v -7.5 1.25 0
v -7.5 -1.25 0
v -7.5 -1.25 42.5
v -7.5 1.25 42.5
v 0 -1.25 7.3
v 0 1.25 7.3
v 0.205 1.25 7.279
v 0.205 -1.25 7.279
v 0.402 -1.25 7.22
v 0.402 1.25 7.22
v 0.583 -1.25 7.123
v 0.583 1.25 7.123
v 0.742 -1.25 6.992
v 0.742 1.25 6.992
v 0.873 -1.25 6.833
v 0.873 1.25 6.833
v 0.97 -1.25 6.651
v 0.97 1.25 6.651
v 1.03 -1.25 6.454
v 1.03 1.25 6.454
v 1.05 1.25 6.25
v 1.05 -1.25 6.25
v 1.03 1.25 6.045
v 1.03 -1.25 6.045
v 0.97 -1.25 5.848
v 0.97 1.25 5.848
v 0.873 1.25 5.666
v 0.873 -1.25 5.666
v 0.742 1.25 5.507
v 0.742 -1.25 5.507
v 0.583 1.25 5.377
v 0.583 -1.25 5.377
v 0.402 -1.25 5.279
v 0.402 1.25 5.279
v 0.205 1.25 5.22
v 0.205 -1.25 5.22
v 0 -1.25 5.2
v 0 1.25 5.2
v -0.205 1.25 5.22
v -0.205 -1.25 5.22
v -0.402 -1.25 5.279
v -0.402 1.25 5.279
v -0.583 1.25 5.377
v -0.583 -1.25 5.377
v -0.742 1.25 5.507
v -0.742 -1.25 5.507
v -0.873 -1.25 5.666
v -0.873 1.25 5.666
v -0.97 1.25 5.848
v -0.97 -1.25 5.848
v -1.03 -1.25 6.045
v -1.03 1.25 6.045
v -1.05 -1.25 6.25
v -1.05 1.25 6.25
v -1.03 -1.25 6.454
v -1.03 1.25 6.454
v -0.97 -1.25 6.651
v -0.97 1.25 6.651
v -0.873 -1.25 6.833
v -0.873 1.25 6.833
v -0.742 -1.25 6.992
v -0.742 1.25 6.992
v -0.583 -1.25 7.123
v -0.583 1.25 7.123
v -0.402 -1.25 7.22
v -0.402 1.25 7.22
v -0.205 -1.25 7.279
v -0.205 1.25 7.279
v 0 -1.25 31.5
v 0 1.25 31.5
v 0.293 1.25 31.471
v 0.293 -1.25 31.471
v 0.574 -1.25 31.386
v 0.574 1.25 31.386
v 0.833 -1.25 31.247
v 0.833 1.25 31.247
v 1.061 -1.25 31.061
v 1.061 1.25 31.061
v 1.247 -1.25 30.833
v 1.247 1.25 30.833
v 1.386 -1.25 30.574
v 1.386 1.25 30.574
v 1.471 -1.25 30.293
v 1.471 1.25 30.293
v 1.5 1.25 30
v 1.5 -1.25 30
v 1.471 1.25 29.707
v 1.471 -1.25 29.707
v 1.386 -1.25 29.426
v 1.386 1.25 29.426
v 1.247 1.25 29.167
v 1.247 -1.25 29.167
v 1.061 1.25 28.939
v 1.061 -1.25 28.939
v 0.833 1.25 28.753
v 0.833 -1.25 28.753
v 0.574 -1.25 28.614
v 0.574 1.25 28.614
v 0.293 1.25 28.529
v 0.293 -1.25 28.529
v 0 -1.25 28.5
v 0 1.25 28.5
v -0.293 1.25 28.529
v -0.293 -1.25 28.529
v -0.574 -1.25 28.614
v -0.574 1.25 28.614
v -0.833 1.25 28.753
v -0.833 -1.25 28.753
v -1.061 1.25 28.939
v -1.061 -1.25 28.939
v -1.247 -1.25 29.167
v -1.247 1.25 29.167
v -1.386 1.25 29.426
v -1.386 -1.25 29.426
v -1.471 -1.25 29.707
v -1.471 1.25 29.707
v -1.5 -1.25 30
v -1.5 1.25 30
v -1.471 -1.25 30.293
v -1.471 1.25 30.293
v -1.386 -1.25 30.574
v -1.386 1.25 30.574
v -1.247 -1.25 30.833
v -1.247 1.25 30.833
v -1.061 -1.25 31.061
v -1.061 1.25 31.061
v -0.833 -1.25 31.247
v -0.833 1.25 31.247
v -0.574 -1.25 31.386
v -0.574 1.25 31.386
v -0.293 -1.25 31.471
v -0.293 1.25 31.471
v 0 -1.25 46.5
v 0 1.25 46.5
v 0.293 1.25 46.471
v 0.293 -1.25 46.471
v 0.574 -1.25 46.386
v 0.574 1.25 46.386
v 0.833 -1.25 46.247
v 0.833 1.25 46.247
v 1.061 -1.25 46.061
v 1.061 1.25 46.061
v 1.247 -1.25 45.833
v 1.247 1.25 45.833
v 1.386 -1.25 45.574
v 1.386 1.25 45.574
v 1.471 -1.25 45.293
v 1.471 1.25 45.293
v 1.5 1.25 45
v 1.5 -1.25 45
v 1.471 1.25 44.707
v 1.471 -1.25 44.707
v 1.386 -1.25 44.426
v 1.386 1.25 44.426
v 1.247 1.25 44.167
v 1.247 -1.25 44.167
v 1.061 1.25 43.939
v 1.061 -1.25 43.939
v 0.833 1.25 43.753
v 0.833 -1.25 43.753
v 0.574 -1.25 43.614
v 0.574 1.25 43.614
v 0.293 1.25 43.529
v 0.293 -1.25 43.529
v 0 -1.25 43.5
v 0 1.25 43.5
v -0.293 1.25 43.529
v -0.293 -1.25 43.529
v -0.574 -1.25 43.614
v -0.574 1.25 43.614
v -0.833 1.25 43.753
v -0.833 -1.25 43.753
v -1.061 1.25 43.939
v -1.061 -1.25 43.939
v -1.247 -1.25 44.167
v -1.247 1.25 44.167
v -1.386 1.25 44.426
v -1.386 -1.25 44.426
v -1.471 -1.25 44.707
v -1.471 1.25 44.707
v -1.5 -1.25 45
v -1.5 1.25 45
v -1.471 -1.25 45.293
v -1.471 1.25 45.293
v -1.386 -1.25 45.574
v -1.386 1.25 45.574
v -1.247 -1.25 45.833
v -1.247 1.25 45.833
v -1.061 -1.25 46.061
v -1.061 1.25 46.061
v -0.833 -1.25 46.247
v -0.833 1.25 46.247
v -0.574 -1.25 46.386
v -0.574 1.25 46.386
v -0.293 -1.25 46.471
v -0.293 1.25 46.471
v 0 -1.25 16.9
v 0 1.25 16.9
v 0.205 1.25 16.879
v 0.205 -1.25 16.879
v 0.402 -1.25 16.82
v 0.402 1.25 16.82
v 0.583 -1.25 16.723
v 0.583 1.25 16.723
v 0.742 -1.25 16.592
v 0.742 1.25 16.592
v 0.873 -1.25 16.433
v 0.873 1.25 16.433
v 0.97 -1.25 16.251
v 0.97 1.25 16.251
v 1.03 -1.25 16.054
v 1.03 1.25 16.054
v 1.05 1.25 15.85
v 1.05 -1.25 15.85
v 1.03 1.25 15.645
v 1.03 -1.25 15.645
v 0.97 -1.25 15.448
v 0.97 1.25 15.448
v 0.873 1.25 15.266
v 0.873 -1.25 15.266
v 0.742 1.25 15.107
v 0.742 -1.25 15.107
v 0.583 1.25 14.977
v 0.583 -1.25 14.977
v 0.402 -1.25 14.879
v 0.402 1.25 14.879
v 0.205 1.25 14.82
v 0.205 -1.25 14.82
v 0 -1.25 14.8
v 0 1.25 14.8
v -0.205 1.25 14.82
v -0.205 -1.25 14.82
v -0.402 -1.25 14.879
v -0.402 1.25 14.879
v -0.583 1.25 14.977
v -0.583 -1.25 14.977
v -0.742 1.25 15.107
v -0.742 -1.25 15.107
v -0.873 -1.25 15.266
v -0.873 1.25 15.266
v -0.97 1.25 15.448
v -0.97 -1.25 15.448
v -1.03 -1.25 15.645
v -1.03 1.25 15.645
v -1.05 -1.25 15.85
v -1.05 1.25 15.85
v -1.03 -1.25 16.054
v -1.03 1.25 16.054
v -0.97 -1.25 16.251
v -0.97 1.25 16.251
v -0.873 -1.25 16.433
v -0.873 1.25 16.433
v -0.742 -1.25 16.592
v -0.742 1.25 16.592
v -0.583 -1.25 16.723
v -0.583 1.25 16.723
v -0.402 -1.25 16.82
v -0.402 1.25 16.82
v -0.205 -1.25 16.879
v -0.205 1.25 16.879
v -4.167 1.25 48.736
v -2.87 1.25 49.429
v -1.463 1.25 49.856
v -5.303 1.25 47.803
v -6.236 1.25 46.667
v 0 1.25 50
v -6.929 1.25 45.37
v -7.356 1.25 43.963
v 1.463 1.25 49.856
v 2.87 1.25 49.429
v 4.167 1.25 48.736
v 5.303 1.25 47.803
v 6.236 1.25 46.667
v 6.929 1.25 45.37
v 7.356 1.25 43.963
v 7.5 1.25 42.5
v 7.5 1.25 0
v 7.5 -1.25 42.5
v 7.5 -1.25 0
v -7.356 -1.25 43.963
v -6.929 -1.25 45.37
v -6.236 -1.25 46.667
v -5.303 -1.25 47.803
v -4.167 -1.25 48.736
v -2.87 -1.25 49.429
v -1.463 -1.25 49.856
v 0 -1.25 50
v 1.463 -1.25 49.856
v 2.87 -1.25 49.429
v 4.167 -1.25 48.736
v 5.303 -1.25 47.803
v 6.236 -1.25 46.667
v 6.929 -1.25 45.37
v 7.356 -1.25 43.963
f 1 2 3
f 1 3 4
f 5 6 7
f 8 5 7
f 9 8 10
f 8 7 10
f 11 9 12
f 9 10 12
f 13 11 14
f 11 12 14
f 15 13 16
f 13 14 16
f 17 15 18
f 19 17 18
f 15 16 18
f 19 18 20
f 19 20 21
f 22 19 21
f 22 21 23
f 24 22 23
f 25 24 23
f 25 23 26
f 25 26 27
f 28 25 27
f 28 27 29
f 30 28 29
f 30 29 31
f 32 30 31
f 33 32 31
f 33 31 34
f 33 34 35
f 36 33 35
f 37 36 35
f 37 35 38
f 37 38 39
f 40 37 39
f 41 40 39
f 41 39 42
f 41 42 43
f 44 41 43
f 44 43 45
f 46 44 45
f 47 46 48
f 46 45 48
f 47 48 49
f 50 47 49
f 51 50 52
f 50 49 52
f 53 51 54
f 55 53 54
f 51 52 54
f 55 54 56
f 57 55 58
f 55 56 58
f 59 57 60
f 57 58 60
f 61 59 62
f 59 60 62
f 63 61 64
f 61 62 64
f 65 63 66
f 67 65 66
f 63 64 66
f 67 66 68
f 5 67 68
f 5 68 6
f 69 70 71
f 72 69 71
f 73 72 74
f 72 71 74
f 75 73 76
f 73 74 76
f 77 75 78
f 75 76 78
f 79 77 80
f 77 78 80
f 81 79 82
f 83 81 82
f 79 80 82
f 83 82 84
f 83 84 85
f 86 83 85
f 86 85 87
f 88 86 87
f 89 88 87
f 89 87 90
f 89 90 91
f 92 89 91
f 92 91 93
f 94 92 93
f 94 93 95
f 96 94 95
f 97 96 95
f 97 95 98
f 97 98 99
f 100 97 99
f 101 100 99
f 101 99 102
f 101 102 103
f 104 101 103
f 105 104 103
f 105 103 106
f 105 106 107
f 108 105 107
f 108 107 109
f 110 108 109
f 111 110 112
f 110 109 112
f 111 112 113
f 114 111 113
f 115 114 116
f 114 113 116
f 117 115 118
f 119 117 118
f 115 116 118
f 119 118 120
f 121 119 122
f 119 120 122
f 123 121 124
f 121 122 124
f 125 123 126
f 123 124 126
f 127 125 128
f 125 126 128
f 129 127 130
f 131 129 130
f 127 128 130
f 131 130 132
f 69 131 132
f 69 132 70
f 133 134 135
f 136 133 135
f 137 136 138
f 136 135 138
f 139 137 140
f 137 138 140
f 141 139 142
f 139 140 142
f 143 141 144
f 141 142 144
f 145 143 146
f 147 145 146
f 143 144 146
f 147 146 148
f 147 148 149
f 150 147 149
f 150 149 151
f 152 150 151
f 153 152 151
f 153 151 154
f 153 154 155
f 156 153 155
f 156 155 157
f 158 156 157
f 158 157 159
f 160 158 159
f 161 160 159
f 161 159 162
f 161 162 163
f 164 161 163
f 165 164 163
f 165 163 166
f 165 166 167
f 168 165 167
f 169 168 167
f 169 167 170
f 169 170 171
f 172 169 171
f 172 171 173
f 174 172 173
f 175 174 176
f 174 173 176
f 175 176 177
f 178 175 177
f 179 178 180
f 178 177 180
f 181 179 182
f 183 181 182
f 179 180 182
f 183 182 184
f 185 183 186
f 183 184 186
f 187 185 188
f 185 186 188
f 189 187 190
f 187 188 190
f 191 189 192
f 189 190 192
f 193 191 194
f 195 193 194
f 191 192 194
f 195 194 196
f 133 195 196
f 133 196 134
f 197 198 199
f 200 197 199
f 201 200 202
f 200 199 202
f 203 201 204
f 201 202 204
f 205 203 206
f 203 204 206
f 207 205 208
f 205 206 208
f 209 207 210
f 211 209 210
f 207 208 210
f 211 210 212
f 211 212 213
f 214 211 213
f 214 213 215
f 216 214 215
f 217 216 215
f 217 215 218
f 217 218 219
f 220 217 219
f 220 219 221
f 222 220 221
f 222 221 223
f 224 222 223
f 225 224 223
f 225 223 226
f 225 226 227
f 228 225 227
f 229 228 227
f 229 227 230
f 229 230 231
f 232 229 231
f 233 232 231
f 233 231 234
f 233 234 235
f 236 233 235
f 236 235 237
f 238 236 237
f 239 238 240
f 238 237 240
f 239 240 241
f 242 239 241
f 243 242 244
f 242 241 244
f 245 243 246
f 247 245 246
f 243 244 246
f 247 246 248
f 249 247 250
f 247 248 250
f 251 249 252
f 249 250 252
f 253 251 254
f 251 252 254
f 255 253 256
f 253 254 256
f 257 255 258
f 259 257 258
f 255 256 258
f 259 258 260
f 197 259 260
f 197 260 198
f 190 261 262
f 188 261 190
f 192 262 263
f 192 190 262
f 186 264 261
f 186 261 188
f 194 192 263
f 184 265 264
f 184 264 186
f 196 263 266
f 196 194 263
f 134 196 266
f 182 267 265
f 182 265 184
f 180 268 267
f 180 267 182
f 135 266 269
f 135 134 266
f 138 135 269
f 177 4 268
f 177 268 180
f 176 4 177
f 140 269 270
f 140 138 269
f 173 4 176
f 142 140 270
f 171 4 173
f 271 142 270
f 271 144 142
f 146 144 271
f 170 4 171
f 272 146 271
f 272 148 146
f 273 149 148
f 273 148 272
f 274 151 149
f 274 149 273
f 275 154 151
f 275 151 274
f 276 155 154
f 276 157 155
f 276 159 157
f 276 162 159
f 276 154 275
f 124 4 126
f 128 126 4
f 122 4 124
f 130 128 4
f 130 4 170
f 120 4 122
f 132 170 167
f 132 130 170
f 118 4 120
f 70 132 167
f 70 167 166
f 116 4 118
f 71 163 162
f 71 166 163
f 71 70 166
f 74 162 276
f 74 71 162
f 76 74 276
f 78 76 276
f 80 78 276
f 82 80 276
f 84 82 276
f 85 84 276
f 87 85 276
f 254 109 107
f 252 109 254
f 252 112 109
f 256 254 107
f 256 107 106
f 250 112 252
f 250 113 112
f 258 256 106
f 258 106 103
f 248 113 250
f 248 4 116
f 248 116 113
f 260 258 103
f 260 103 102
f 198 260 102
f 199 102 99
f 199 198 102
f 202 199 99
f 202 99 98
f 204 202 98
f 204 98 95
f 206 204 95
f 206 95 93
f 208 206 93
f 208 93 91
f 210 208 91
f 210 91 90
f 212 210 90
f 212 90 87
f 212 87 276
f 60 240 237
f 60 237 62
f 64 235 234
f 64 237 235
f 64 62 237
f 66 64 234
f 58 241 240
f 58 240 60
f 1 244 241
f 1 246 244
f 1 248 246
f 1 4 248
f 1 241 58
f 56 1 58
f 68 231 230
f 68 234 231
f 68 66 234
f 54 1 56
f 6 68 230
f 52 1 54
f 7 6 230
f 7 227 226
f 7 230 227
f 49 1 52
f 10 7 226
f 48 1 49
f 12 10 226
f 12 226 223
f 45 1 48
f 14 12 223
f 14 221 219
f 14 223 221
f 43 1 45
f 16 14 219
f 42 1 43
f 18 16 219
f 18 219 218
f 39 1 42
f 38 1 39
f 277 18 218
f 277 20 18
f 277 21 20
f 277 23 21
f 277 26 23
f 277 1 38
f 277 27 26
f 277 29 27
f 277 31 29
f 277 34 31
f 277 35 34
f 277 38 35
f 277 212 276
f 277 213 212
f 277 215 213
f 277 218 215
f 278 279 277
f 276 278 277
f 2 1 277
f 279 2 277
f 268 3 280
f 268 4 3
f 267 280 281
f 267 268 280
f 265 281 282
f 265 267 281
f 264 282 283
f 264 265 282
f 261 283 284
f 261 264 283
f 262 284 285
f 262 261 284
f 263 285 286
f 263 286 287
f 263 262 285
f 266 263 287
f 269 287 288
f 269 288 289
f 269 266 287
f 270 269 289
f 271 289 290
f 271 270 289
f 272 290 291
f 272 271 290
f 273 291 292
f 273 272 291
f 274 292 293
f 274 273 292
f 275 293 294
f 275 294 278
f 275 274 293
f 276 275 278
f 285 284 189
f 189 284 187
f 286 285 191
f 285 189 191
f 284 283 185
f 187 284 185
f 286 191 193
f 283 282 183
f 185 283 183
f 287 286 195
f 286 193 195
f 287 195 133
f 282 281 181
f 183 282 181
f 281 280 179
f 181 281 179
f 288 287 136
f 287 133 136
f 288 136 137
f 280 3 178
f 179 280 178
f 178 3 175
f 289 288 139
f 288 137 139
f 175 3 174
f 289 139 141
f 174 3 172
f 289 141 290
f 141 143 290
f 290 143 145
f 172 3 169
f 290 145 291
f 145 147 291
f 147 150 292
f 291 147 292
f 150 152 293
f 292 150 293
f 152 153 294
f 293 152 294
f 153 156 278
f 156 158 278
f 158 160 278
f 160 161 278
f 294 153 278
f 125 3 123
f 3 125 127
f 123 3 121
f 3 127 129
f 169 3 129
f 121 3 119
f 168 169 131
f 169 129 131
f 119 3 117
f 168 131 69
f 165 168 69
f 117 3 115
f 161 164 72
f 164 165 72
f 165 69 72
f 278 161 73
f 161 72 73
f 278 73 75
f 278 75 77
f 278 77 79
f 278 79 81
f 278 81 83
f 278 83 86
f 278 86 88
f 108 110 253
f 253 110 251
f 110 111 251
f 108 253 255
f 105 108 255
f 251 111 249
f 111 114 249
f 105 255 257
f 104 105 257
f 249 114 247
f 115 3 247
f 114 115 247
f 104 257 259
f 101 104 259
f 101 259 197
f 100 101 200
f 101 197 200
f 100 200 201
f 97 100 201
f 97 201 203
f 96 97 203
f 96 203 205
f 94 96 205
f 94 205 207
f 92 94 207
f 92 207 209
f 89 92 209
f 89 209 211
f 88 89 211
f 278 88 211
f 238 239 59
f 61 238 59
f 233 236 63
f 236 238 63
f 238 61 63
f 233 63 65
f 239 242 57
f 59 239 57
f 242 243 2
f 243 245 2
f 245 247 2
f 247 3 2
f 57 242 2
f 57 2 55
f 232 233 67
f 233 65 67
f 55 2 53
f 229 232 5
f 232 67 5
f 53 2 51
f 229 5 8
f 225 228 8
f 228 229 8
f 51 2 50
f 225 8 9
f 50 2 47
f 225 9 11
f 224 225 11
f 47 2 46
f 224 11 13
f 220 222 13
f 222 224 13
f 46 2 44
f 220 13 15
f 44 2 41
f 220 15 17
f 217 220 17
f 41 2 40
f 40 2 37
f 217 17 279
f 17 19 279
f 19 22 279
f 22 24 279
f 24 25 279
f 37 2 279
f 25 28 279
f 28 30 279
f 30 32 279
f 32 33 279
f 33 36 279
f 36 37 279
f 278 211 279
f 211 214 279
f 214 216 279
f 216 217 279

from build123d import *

# Parameters (mm, degrees)
ESQUISSE1_W                = 15
ESQUISSE1_H                = 2.5
EXTRUSION1_DEPTH           = 50
ESQUISSE2_R                = 1.5
EXTRUSION2_DEPTH           = 51.621141828
R_P_TITION_LIN_AIRE1_COUNT = 2
R_P_TITION_LIN_AIRE1_PITCH = 15
CONG_1_R                   = 7.5
ESQUISSE5_R                = 1.05
ENL_V_MAT_EXTRU_3_DEPTH    = 10
ESQUISSE6_R                = 1.05
ENL_V_MAT_EXTRU_4_DEPTH    = 10


with BuildPart() as part:
    # Esquisse1 → Extrusion1 (new body)
    with BuildSketch(Plane.XY):
        Rectangle(ESQUISSE1_W, ESQUISSE1_H)
    extrude(amount=EXTRUSION1_DEPTH)

    # Esquisse2 → Extrusion2 (cut, through all)
    with BuildSketch(Plane(origin=(0, 1.25, 0), x_dir=(1, 0, 0), z_dir=(0, 1, 0))):
        with Locations(Location((0, -45, 0), (0, 0, 270))):
            Circle(ESQUISSE2_R)
    extrusion2 = extrude(amount=-EXTRUSION2_DEPTH, mode=Mode.SUBTRACT)

    # Répétition linéaire1: Extrusion2 ×2
    with Locations(*[(0, 0, -i * R_P_TITION_LIN_AIRE1_PITCH) for i in range(1, R_P_TITION_LIN_AIRE1_COUNT)]):
        add(extrusion2, mode=Mode.SUBTRACT)

    # Congé1
    cong_1_edges = [part.edges().sort_by_distance(p)[0] for p in [
        (-7.5, 0, 50),
        (7.5, 0, 50),
    ]]
    fillet(cong_1_edges, radius=CONG_1_R - 0.0001)  # a hair under: the kernel refuses the full size

    # Esquisse5 → Enlèv. mat.-Extru.3 (cut)
    with BuildSketch(Plane(origin=(0, 1.25, 0), x_dir=(-1, 0, 0), z_dir=(0, 1, 0))):
        with Locations(Location((0, 6.249569422, 0), (0, 0, 90))):
            Circle(ESQUISSE5_R)
    extrude(amount=-ENL_V_MAT_EXTRU_3_DEPTH, mode=Mode.SUBTRACT)

    # Esquisse6 → Enlèv. mat.-Extru.4 (cut)
    with BuildSketch(Plane(origin=(0, 1.25, 0), x_dir=(1, 0, 0), z_dir=(0, 1, 0))):
        with Locations(Location((0, -15.849569422, 0), (0, 0, 270))):
            Circle(ESQUISSE6_R)
    extrude(amount=-ENL_V_MAT_EXTRU_4_DEPTH, mode=Mode.SUBTRACT)


solid = part.part
